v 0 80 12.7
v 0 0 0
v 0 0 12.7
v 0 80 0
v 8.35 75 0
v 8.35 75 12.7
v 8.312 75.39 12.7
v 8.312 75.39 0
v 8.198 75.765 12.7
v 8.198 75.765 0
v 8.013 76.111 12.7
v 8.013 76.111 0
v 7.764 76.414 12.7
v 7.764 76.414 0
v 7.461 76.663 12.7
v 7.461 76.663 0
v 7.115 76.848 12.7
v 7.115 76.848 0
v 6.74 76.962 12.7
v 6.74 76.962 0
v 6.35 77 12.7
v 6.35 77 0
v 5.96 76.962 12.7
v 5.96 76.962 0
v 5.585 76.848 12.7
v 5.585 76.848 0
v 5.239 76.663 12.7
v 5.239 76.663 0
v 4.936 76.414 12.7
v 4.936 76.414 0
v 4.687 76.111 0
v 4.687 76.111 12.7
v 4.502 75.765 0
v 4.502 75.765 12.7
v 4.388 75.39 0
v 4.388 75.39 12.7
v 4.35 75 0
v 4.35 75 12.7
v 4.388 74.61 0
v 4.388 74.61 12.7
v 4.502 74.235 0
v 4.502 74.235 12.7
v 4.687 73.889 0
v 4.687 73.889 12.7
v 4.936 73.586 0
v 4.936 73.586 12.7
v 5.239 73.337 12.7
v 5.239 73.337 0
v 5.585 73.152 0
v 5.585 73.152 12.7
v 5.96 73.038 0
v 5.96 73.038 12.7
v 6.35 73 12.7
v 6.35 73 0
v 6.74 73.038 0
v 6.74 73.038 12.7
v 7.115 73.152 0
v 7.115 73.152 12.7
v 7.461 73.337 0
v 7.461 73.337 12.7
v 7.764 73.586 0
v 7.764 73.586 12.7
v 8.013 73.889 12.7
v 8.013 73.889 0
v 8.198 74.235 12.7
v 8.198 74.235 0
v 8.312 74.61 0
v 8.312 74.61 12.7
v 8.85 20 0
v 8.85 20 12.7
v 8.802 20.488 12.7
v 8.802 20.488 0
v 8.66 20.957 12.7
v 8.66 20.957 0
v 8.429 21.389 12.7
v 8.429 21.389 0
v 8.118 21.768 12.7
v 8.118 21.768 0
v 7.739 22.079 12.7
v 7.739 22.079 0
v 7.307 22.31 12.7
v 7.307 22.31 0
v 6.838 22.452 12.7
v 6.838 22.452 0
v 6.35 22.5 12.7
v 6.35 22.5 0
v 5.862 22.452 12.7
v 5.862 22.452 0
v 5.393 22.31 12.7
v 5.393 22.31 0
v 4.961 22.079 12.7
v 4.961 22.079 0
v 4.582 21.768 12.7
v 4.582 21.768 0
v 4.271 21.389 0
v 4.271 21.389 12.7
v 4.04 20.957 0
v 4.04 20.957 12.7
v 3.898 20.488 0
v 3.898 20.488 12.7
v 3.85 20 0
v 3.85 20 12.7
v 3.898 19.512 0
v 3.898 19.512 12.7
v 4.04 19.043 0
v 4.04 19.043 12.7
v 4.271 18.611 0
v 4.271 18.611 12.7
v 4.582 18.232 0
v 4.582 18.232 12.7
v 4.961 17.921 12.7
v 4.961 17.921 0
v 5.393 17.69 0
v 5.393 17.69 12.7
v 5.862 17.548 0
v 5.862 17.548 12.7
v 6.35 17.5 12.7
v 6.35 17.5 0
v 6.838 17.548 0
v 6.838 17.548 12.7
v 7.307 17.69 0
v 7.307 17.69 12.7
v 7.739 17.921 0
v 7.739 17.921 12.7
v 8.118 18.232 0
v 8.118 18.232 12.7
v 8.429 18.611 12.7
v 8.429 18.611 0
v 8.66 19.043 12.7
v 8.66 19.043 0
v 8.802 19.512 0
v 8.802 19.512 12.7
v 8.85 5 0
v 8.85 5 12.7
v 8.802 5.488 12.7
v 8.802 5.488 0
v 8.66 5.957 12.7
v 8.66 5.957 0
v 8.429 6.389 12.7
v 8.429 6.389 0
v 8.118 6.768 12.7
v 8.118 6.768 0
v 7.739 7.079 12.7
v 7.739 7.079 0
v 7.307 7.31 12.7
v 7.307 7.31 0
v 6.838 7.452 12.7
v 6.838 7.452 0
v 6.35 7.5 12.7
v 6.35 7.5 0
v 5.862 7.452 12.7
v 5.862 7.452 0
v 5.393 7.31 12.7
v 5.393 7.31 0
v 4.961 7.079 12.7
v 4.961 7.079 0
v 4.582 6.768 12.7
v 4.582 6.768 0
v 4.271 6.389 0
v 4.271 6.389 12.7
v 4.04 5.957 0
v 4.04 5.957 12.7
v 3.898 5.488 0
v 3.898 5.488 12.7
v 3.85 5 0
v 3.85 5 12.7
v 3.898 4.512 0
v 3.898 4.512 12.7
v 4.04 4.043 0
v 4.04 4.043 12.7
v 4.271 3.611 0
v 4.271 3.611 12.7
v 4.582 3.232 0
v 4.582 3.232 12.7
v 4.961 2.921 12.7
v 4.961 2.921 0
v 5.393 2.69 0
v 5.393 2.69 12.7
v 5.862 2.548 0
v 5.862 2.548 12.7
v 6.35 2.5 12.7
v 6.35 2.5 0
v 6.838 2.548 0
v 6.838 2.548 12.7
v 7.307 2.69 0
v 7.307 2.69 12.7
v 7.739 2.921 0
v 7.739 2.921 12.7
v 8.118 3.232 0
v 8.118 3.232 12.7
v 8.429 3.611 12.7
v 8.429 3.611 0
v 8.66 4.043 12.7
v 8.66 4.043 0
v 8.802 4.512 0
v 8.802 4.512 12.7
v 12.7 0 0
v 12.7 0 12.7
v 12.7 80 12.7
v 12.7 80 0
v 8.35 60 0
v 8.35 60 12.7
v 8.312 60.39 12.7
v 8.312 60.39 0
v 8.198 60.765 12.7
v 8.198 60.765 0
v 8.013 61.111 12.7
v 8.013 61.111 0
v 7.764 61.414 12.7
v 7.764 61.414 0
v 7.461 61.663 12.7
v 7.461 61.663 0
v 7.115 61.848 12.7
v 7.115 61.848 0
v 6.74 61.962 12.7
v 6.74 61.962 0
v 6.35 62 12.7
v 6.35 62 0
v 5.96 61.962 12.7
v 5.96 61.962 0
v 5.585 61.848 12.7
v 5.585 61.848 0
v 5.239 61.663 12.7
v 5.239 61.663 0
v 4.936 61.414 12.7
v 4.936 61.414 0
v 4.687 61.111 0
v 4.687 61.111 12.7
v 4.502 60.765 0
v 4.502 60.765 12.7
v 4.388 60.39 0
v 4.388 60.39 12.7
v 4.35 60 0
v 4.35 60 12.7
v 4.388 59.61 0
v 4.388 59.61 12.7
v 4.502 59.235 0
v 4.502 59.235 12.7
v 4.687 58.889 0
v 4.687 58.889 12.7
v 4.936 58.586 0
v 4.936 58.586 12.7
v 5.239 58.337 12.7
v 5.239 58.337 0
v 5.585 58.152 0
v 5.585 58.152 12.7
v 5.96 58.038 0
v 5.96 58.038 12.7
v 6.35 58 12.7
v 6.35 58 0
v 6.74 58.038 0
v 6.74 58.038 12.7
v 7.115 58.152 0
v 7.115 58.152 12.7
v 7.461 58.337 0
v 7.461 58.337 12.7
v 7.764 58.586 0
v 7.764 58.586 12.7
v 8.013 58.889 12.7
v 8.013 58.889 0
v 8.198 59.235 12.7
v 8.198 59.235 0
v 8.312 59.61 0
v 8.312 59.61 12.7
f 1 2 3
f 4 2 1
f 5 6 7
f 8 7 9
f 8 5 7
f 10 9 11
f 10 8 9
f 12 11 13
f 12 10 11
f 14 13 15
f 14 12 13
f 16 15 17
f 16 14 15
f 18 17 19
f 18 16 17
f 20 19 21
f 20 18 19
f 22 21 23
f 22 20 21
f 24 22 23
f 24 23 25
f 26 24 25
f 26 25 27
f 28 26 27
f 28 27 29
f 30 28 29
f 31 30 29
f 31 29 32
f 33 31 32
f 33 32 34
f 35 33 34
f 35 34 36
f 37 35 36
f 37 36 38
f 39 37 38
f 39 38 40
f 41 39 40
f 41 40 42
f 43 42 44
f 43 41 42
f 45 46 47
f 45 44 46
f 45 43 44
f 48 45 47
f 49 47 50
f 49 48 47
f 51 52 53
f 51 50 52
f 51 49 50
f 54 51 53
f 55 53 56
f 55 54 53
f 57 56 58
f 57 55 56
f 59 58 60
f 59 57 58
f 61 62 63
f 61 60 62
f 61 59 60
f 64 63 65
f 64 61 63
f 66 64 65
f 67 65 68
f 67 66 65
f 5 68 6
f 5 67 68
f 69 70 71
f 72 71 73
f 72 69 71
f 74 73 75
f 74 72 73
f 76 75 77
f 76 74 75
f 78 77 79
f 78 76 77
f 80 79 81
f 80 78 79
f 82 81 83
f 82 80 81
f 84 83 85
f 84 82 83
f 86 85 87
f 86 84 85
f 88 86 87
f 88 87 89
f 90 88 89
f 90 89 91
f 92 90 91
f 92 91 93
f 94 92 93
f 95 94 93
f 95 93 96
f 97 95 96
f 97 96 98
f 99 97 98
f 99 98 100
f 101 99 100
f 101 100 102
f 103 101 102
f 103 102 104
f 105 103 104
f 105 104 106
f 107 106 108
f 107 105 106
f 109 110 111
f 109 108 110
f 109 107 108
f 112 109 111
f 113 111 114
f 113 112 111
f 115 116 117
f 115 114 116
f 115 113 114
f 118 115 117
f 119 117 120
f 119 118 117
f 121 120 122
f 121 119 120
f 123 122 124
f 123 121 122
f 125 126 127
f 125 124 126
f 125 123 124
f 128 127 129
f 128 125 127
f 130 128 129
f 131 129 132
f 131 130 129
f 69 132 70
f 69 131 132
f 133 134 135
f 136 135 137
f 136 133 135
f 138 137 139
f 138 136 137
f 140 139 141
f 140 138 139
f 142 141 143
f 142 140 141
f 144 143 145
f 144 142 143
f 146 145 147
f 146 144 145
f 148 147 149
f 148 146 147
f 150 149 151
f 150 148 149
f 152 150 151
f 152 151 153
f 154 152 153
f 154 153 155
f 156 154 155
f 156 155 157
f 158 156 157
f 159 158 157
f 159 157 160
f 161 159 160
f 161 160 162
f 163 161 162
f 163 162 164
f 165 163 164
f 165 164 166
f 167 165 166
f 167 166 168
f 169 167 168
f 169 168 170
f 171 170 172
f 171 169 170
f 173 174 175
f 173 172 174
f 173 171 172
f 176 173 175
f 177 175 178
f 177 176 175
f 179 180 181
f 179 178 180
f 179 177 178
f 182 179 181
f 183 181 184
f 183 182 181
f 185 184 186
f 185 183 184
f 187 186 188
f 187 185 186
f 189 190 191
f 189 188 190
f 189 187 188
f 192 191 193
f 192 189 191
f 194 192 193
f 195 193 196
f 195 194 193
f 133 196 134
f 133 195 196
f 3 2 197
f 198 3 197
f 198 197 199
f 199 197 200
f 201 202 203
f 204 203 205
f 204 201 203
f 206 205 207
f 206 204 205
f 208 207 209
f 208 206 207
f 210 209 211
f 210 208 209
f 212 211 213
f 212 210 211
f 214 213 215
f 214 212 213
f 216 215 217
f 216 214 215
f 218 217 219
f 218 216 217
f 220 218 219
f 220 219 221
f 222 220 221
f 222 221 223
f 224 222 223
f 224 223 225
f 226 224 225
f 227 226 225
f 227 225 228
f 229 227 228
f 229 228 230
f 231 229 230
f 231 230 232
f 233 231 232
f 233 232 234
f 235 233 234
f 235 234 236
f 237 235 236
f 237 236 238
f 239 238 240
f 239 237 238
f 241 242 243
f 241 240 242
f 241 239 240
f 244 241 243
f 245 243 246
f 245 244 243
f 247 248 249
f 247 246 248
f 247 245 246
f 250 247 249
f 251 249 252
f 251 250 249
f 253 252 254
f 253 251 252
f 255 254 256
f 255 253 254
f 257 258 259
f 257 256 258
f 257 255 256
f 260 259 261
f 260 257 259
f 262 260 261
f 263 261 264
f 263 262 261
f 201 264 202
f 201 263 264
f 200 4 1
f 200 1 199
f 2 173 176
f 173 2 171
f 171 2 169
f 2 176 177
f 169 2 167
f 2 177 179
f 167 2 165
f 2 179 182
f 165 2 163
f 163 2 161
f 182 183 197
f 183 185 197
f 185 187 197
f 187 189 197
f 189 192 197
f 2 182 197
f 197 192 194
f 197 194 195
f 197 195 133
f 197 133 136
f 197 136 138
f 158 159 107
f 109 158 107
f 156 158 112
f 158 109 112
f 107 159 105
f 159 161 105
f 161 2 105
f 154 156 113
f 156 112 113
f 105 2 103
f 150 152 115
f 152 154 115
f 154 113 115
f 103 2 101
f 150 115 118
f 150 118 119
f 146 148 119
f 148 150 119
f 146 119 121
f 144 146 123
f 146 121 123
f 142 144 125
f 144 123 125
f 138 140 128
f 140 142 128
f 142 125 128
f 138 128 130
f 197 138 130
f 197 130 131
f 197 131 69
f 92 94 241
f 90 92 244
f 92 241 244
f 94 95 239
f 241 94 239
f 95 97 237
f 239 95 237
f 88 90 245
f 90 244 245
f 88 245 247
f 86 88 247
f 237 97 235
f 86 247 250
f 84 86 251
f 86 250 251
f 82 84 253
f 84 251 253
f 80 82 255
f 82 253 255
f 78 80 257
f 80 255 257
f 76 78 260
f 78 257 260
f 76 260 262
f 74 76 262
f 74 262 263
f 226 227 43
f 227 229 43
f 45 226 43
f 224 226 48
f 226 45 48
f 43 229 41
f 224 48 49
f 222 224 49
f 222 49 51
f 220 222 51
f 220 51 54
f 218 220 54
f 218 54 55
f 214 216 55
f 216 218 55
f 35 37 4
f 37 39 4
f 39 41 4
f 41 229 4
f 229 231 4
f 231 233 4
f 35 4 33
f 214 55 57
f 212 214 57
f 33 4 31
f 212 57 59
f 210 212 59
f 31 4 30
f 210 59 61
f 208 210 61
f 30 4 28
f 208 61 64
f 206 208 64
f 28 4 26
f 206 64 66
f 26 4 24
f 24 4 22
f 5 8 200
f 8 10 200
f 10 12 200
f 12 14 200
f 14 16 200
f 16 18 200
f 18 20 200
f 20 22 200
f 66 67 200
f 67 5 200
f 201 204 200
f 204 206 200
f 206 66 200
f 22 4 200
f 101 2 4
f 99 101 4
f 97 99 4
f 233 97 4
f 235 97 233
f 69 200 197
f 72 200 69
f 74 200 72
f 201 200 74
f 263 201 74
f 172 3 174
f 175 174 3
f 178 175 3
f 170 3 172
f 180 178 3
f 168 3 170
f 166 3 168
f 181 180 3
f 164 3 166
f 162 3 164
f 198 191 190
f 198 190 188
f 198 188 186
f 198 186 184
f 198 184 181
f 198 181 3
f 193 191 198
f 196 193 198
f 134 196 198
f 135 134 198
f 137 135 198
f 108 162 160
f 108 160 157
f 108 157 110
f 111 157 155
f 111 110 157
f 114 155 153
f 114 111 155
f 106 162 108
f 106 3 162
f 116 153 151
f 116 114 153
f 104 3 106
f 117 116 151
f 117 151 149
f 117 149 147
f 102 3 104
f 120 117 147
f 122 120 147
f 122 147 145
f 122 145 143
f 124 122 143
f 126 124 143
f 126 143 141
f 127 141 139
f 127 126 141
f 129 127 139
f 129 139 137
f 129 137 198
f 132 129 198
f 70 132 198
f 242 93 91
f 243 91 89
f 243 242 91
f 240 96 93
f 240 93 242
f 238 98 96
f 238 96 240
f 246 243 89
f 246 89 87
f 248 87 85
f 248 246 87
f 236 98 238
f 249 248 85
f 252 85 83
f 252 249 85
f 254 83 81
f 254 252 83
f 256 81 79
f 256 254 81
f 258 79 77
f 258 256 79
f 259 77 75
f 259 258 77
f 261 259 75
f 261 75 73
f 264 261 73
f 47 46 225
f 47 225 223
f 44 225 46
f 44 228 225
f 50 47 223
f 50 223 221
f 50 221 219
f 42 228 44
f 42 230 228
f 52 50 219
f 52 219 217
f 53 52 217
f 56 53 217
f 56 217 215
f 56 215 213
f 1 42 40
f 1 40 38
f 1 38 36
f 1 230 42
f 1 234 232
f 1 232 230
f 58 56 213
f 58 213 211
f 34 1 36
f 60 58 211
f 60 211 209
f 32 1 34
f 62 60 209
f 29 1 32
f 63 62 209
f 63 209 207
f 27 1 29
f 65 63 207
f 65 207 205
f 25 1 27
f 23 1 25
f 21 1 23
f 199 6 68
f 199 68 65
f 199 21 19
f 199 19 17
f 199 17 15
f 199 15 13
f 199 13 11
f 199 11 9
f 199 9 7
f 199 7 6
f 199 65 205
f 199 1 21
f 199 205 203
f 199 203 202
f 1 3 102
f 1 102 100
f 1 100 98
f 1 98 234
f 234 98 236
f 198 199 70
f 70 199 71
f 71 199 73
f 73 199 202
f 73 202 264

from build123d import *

# Parameters (mm, degrees)
SKETCH1_W           = 12.7
SKETCH1_H           = 80
BOSS_EXTRUDE1_DEPTH = 12.7
SKETCH2_R           = 2.5
SKETCH2_R_2         = 2
CUT_EXTRUDE1_DEPTH  = 13.7


with BuildPart() as part:
    # Sketch1 → Boss-Extrude1 (new body)
    with BuildSketch(Plane.XY):
        with Locations((6.35, 40)):
            Rectangle(SKETCH1_W, SKETCH1_H)
    extrude(amount=BOSS_EXTRUDE1_DEPTH)

    # Sketch2 → Cut-Extrude1 (cut, through all)
    with BuildSketch(Plane.XY):
        with Locations((6.35, 5)):
            Circle(SKETCH2_R)
        with Locations((6.35, 20)):
            Circle(SKETCH2_R)
        with Locations((6.35, 60)):
            Circle(SKETCH2_R_2)
        with Locations((6.35, 75)):
            Circle(SKETCH2_R_2)
    extrude(amount=CUT_EXTRUDE1_DEPTH, mode=Mode.SUBTRACT)


solid = part.part
